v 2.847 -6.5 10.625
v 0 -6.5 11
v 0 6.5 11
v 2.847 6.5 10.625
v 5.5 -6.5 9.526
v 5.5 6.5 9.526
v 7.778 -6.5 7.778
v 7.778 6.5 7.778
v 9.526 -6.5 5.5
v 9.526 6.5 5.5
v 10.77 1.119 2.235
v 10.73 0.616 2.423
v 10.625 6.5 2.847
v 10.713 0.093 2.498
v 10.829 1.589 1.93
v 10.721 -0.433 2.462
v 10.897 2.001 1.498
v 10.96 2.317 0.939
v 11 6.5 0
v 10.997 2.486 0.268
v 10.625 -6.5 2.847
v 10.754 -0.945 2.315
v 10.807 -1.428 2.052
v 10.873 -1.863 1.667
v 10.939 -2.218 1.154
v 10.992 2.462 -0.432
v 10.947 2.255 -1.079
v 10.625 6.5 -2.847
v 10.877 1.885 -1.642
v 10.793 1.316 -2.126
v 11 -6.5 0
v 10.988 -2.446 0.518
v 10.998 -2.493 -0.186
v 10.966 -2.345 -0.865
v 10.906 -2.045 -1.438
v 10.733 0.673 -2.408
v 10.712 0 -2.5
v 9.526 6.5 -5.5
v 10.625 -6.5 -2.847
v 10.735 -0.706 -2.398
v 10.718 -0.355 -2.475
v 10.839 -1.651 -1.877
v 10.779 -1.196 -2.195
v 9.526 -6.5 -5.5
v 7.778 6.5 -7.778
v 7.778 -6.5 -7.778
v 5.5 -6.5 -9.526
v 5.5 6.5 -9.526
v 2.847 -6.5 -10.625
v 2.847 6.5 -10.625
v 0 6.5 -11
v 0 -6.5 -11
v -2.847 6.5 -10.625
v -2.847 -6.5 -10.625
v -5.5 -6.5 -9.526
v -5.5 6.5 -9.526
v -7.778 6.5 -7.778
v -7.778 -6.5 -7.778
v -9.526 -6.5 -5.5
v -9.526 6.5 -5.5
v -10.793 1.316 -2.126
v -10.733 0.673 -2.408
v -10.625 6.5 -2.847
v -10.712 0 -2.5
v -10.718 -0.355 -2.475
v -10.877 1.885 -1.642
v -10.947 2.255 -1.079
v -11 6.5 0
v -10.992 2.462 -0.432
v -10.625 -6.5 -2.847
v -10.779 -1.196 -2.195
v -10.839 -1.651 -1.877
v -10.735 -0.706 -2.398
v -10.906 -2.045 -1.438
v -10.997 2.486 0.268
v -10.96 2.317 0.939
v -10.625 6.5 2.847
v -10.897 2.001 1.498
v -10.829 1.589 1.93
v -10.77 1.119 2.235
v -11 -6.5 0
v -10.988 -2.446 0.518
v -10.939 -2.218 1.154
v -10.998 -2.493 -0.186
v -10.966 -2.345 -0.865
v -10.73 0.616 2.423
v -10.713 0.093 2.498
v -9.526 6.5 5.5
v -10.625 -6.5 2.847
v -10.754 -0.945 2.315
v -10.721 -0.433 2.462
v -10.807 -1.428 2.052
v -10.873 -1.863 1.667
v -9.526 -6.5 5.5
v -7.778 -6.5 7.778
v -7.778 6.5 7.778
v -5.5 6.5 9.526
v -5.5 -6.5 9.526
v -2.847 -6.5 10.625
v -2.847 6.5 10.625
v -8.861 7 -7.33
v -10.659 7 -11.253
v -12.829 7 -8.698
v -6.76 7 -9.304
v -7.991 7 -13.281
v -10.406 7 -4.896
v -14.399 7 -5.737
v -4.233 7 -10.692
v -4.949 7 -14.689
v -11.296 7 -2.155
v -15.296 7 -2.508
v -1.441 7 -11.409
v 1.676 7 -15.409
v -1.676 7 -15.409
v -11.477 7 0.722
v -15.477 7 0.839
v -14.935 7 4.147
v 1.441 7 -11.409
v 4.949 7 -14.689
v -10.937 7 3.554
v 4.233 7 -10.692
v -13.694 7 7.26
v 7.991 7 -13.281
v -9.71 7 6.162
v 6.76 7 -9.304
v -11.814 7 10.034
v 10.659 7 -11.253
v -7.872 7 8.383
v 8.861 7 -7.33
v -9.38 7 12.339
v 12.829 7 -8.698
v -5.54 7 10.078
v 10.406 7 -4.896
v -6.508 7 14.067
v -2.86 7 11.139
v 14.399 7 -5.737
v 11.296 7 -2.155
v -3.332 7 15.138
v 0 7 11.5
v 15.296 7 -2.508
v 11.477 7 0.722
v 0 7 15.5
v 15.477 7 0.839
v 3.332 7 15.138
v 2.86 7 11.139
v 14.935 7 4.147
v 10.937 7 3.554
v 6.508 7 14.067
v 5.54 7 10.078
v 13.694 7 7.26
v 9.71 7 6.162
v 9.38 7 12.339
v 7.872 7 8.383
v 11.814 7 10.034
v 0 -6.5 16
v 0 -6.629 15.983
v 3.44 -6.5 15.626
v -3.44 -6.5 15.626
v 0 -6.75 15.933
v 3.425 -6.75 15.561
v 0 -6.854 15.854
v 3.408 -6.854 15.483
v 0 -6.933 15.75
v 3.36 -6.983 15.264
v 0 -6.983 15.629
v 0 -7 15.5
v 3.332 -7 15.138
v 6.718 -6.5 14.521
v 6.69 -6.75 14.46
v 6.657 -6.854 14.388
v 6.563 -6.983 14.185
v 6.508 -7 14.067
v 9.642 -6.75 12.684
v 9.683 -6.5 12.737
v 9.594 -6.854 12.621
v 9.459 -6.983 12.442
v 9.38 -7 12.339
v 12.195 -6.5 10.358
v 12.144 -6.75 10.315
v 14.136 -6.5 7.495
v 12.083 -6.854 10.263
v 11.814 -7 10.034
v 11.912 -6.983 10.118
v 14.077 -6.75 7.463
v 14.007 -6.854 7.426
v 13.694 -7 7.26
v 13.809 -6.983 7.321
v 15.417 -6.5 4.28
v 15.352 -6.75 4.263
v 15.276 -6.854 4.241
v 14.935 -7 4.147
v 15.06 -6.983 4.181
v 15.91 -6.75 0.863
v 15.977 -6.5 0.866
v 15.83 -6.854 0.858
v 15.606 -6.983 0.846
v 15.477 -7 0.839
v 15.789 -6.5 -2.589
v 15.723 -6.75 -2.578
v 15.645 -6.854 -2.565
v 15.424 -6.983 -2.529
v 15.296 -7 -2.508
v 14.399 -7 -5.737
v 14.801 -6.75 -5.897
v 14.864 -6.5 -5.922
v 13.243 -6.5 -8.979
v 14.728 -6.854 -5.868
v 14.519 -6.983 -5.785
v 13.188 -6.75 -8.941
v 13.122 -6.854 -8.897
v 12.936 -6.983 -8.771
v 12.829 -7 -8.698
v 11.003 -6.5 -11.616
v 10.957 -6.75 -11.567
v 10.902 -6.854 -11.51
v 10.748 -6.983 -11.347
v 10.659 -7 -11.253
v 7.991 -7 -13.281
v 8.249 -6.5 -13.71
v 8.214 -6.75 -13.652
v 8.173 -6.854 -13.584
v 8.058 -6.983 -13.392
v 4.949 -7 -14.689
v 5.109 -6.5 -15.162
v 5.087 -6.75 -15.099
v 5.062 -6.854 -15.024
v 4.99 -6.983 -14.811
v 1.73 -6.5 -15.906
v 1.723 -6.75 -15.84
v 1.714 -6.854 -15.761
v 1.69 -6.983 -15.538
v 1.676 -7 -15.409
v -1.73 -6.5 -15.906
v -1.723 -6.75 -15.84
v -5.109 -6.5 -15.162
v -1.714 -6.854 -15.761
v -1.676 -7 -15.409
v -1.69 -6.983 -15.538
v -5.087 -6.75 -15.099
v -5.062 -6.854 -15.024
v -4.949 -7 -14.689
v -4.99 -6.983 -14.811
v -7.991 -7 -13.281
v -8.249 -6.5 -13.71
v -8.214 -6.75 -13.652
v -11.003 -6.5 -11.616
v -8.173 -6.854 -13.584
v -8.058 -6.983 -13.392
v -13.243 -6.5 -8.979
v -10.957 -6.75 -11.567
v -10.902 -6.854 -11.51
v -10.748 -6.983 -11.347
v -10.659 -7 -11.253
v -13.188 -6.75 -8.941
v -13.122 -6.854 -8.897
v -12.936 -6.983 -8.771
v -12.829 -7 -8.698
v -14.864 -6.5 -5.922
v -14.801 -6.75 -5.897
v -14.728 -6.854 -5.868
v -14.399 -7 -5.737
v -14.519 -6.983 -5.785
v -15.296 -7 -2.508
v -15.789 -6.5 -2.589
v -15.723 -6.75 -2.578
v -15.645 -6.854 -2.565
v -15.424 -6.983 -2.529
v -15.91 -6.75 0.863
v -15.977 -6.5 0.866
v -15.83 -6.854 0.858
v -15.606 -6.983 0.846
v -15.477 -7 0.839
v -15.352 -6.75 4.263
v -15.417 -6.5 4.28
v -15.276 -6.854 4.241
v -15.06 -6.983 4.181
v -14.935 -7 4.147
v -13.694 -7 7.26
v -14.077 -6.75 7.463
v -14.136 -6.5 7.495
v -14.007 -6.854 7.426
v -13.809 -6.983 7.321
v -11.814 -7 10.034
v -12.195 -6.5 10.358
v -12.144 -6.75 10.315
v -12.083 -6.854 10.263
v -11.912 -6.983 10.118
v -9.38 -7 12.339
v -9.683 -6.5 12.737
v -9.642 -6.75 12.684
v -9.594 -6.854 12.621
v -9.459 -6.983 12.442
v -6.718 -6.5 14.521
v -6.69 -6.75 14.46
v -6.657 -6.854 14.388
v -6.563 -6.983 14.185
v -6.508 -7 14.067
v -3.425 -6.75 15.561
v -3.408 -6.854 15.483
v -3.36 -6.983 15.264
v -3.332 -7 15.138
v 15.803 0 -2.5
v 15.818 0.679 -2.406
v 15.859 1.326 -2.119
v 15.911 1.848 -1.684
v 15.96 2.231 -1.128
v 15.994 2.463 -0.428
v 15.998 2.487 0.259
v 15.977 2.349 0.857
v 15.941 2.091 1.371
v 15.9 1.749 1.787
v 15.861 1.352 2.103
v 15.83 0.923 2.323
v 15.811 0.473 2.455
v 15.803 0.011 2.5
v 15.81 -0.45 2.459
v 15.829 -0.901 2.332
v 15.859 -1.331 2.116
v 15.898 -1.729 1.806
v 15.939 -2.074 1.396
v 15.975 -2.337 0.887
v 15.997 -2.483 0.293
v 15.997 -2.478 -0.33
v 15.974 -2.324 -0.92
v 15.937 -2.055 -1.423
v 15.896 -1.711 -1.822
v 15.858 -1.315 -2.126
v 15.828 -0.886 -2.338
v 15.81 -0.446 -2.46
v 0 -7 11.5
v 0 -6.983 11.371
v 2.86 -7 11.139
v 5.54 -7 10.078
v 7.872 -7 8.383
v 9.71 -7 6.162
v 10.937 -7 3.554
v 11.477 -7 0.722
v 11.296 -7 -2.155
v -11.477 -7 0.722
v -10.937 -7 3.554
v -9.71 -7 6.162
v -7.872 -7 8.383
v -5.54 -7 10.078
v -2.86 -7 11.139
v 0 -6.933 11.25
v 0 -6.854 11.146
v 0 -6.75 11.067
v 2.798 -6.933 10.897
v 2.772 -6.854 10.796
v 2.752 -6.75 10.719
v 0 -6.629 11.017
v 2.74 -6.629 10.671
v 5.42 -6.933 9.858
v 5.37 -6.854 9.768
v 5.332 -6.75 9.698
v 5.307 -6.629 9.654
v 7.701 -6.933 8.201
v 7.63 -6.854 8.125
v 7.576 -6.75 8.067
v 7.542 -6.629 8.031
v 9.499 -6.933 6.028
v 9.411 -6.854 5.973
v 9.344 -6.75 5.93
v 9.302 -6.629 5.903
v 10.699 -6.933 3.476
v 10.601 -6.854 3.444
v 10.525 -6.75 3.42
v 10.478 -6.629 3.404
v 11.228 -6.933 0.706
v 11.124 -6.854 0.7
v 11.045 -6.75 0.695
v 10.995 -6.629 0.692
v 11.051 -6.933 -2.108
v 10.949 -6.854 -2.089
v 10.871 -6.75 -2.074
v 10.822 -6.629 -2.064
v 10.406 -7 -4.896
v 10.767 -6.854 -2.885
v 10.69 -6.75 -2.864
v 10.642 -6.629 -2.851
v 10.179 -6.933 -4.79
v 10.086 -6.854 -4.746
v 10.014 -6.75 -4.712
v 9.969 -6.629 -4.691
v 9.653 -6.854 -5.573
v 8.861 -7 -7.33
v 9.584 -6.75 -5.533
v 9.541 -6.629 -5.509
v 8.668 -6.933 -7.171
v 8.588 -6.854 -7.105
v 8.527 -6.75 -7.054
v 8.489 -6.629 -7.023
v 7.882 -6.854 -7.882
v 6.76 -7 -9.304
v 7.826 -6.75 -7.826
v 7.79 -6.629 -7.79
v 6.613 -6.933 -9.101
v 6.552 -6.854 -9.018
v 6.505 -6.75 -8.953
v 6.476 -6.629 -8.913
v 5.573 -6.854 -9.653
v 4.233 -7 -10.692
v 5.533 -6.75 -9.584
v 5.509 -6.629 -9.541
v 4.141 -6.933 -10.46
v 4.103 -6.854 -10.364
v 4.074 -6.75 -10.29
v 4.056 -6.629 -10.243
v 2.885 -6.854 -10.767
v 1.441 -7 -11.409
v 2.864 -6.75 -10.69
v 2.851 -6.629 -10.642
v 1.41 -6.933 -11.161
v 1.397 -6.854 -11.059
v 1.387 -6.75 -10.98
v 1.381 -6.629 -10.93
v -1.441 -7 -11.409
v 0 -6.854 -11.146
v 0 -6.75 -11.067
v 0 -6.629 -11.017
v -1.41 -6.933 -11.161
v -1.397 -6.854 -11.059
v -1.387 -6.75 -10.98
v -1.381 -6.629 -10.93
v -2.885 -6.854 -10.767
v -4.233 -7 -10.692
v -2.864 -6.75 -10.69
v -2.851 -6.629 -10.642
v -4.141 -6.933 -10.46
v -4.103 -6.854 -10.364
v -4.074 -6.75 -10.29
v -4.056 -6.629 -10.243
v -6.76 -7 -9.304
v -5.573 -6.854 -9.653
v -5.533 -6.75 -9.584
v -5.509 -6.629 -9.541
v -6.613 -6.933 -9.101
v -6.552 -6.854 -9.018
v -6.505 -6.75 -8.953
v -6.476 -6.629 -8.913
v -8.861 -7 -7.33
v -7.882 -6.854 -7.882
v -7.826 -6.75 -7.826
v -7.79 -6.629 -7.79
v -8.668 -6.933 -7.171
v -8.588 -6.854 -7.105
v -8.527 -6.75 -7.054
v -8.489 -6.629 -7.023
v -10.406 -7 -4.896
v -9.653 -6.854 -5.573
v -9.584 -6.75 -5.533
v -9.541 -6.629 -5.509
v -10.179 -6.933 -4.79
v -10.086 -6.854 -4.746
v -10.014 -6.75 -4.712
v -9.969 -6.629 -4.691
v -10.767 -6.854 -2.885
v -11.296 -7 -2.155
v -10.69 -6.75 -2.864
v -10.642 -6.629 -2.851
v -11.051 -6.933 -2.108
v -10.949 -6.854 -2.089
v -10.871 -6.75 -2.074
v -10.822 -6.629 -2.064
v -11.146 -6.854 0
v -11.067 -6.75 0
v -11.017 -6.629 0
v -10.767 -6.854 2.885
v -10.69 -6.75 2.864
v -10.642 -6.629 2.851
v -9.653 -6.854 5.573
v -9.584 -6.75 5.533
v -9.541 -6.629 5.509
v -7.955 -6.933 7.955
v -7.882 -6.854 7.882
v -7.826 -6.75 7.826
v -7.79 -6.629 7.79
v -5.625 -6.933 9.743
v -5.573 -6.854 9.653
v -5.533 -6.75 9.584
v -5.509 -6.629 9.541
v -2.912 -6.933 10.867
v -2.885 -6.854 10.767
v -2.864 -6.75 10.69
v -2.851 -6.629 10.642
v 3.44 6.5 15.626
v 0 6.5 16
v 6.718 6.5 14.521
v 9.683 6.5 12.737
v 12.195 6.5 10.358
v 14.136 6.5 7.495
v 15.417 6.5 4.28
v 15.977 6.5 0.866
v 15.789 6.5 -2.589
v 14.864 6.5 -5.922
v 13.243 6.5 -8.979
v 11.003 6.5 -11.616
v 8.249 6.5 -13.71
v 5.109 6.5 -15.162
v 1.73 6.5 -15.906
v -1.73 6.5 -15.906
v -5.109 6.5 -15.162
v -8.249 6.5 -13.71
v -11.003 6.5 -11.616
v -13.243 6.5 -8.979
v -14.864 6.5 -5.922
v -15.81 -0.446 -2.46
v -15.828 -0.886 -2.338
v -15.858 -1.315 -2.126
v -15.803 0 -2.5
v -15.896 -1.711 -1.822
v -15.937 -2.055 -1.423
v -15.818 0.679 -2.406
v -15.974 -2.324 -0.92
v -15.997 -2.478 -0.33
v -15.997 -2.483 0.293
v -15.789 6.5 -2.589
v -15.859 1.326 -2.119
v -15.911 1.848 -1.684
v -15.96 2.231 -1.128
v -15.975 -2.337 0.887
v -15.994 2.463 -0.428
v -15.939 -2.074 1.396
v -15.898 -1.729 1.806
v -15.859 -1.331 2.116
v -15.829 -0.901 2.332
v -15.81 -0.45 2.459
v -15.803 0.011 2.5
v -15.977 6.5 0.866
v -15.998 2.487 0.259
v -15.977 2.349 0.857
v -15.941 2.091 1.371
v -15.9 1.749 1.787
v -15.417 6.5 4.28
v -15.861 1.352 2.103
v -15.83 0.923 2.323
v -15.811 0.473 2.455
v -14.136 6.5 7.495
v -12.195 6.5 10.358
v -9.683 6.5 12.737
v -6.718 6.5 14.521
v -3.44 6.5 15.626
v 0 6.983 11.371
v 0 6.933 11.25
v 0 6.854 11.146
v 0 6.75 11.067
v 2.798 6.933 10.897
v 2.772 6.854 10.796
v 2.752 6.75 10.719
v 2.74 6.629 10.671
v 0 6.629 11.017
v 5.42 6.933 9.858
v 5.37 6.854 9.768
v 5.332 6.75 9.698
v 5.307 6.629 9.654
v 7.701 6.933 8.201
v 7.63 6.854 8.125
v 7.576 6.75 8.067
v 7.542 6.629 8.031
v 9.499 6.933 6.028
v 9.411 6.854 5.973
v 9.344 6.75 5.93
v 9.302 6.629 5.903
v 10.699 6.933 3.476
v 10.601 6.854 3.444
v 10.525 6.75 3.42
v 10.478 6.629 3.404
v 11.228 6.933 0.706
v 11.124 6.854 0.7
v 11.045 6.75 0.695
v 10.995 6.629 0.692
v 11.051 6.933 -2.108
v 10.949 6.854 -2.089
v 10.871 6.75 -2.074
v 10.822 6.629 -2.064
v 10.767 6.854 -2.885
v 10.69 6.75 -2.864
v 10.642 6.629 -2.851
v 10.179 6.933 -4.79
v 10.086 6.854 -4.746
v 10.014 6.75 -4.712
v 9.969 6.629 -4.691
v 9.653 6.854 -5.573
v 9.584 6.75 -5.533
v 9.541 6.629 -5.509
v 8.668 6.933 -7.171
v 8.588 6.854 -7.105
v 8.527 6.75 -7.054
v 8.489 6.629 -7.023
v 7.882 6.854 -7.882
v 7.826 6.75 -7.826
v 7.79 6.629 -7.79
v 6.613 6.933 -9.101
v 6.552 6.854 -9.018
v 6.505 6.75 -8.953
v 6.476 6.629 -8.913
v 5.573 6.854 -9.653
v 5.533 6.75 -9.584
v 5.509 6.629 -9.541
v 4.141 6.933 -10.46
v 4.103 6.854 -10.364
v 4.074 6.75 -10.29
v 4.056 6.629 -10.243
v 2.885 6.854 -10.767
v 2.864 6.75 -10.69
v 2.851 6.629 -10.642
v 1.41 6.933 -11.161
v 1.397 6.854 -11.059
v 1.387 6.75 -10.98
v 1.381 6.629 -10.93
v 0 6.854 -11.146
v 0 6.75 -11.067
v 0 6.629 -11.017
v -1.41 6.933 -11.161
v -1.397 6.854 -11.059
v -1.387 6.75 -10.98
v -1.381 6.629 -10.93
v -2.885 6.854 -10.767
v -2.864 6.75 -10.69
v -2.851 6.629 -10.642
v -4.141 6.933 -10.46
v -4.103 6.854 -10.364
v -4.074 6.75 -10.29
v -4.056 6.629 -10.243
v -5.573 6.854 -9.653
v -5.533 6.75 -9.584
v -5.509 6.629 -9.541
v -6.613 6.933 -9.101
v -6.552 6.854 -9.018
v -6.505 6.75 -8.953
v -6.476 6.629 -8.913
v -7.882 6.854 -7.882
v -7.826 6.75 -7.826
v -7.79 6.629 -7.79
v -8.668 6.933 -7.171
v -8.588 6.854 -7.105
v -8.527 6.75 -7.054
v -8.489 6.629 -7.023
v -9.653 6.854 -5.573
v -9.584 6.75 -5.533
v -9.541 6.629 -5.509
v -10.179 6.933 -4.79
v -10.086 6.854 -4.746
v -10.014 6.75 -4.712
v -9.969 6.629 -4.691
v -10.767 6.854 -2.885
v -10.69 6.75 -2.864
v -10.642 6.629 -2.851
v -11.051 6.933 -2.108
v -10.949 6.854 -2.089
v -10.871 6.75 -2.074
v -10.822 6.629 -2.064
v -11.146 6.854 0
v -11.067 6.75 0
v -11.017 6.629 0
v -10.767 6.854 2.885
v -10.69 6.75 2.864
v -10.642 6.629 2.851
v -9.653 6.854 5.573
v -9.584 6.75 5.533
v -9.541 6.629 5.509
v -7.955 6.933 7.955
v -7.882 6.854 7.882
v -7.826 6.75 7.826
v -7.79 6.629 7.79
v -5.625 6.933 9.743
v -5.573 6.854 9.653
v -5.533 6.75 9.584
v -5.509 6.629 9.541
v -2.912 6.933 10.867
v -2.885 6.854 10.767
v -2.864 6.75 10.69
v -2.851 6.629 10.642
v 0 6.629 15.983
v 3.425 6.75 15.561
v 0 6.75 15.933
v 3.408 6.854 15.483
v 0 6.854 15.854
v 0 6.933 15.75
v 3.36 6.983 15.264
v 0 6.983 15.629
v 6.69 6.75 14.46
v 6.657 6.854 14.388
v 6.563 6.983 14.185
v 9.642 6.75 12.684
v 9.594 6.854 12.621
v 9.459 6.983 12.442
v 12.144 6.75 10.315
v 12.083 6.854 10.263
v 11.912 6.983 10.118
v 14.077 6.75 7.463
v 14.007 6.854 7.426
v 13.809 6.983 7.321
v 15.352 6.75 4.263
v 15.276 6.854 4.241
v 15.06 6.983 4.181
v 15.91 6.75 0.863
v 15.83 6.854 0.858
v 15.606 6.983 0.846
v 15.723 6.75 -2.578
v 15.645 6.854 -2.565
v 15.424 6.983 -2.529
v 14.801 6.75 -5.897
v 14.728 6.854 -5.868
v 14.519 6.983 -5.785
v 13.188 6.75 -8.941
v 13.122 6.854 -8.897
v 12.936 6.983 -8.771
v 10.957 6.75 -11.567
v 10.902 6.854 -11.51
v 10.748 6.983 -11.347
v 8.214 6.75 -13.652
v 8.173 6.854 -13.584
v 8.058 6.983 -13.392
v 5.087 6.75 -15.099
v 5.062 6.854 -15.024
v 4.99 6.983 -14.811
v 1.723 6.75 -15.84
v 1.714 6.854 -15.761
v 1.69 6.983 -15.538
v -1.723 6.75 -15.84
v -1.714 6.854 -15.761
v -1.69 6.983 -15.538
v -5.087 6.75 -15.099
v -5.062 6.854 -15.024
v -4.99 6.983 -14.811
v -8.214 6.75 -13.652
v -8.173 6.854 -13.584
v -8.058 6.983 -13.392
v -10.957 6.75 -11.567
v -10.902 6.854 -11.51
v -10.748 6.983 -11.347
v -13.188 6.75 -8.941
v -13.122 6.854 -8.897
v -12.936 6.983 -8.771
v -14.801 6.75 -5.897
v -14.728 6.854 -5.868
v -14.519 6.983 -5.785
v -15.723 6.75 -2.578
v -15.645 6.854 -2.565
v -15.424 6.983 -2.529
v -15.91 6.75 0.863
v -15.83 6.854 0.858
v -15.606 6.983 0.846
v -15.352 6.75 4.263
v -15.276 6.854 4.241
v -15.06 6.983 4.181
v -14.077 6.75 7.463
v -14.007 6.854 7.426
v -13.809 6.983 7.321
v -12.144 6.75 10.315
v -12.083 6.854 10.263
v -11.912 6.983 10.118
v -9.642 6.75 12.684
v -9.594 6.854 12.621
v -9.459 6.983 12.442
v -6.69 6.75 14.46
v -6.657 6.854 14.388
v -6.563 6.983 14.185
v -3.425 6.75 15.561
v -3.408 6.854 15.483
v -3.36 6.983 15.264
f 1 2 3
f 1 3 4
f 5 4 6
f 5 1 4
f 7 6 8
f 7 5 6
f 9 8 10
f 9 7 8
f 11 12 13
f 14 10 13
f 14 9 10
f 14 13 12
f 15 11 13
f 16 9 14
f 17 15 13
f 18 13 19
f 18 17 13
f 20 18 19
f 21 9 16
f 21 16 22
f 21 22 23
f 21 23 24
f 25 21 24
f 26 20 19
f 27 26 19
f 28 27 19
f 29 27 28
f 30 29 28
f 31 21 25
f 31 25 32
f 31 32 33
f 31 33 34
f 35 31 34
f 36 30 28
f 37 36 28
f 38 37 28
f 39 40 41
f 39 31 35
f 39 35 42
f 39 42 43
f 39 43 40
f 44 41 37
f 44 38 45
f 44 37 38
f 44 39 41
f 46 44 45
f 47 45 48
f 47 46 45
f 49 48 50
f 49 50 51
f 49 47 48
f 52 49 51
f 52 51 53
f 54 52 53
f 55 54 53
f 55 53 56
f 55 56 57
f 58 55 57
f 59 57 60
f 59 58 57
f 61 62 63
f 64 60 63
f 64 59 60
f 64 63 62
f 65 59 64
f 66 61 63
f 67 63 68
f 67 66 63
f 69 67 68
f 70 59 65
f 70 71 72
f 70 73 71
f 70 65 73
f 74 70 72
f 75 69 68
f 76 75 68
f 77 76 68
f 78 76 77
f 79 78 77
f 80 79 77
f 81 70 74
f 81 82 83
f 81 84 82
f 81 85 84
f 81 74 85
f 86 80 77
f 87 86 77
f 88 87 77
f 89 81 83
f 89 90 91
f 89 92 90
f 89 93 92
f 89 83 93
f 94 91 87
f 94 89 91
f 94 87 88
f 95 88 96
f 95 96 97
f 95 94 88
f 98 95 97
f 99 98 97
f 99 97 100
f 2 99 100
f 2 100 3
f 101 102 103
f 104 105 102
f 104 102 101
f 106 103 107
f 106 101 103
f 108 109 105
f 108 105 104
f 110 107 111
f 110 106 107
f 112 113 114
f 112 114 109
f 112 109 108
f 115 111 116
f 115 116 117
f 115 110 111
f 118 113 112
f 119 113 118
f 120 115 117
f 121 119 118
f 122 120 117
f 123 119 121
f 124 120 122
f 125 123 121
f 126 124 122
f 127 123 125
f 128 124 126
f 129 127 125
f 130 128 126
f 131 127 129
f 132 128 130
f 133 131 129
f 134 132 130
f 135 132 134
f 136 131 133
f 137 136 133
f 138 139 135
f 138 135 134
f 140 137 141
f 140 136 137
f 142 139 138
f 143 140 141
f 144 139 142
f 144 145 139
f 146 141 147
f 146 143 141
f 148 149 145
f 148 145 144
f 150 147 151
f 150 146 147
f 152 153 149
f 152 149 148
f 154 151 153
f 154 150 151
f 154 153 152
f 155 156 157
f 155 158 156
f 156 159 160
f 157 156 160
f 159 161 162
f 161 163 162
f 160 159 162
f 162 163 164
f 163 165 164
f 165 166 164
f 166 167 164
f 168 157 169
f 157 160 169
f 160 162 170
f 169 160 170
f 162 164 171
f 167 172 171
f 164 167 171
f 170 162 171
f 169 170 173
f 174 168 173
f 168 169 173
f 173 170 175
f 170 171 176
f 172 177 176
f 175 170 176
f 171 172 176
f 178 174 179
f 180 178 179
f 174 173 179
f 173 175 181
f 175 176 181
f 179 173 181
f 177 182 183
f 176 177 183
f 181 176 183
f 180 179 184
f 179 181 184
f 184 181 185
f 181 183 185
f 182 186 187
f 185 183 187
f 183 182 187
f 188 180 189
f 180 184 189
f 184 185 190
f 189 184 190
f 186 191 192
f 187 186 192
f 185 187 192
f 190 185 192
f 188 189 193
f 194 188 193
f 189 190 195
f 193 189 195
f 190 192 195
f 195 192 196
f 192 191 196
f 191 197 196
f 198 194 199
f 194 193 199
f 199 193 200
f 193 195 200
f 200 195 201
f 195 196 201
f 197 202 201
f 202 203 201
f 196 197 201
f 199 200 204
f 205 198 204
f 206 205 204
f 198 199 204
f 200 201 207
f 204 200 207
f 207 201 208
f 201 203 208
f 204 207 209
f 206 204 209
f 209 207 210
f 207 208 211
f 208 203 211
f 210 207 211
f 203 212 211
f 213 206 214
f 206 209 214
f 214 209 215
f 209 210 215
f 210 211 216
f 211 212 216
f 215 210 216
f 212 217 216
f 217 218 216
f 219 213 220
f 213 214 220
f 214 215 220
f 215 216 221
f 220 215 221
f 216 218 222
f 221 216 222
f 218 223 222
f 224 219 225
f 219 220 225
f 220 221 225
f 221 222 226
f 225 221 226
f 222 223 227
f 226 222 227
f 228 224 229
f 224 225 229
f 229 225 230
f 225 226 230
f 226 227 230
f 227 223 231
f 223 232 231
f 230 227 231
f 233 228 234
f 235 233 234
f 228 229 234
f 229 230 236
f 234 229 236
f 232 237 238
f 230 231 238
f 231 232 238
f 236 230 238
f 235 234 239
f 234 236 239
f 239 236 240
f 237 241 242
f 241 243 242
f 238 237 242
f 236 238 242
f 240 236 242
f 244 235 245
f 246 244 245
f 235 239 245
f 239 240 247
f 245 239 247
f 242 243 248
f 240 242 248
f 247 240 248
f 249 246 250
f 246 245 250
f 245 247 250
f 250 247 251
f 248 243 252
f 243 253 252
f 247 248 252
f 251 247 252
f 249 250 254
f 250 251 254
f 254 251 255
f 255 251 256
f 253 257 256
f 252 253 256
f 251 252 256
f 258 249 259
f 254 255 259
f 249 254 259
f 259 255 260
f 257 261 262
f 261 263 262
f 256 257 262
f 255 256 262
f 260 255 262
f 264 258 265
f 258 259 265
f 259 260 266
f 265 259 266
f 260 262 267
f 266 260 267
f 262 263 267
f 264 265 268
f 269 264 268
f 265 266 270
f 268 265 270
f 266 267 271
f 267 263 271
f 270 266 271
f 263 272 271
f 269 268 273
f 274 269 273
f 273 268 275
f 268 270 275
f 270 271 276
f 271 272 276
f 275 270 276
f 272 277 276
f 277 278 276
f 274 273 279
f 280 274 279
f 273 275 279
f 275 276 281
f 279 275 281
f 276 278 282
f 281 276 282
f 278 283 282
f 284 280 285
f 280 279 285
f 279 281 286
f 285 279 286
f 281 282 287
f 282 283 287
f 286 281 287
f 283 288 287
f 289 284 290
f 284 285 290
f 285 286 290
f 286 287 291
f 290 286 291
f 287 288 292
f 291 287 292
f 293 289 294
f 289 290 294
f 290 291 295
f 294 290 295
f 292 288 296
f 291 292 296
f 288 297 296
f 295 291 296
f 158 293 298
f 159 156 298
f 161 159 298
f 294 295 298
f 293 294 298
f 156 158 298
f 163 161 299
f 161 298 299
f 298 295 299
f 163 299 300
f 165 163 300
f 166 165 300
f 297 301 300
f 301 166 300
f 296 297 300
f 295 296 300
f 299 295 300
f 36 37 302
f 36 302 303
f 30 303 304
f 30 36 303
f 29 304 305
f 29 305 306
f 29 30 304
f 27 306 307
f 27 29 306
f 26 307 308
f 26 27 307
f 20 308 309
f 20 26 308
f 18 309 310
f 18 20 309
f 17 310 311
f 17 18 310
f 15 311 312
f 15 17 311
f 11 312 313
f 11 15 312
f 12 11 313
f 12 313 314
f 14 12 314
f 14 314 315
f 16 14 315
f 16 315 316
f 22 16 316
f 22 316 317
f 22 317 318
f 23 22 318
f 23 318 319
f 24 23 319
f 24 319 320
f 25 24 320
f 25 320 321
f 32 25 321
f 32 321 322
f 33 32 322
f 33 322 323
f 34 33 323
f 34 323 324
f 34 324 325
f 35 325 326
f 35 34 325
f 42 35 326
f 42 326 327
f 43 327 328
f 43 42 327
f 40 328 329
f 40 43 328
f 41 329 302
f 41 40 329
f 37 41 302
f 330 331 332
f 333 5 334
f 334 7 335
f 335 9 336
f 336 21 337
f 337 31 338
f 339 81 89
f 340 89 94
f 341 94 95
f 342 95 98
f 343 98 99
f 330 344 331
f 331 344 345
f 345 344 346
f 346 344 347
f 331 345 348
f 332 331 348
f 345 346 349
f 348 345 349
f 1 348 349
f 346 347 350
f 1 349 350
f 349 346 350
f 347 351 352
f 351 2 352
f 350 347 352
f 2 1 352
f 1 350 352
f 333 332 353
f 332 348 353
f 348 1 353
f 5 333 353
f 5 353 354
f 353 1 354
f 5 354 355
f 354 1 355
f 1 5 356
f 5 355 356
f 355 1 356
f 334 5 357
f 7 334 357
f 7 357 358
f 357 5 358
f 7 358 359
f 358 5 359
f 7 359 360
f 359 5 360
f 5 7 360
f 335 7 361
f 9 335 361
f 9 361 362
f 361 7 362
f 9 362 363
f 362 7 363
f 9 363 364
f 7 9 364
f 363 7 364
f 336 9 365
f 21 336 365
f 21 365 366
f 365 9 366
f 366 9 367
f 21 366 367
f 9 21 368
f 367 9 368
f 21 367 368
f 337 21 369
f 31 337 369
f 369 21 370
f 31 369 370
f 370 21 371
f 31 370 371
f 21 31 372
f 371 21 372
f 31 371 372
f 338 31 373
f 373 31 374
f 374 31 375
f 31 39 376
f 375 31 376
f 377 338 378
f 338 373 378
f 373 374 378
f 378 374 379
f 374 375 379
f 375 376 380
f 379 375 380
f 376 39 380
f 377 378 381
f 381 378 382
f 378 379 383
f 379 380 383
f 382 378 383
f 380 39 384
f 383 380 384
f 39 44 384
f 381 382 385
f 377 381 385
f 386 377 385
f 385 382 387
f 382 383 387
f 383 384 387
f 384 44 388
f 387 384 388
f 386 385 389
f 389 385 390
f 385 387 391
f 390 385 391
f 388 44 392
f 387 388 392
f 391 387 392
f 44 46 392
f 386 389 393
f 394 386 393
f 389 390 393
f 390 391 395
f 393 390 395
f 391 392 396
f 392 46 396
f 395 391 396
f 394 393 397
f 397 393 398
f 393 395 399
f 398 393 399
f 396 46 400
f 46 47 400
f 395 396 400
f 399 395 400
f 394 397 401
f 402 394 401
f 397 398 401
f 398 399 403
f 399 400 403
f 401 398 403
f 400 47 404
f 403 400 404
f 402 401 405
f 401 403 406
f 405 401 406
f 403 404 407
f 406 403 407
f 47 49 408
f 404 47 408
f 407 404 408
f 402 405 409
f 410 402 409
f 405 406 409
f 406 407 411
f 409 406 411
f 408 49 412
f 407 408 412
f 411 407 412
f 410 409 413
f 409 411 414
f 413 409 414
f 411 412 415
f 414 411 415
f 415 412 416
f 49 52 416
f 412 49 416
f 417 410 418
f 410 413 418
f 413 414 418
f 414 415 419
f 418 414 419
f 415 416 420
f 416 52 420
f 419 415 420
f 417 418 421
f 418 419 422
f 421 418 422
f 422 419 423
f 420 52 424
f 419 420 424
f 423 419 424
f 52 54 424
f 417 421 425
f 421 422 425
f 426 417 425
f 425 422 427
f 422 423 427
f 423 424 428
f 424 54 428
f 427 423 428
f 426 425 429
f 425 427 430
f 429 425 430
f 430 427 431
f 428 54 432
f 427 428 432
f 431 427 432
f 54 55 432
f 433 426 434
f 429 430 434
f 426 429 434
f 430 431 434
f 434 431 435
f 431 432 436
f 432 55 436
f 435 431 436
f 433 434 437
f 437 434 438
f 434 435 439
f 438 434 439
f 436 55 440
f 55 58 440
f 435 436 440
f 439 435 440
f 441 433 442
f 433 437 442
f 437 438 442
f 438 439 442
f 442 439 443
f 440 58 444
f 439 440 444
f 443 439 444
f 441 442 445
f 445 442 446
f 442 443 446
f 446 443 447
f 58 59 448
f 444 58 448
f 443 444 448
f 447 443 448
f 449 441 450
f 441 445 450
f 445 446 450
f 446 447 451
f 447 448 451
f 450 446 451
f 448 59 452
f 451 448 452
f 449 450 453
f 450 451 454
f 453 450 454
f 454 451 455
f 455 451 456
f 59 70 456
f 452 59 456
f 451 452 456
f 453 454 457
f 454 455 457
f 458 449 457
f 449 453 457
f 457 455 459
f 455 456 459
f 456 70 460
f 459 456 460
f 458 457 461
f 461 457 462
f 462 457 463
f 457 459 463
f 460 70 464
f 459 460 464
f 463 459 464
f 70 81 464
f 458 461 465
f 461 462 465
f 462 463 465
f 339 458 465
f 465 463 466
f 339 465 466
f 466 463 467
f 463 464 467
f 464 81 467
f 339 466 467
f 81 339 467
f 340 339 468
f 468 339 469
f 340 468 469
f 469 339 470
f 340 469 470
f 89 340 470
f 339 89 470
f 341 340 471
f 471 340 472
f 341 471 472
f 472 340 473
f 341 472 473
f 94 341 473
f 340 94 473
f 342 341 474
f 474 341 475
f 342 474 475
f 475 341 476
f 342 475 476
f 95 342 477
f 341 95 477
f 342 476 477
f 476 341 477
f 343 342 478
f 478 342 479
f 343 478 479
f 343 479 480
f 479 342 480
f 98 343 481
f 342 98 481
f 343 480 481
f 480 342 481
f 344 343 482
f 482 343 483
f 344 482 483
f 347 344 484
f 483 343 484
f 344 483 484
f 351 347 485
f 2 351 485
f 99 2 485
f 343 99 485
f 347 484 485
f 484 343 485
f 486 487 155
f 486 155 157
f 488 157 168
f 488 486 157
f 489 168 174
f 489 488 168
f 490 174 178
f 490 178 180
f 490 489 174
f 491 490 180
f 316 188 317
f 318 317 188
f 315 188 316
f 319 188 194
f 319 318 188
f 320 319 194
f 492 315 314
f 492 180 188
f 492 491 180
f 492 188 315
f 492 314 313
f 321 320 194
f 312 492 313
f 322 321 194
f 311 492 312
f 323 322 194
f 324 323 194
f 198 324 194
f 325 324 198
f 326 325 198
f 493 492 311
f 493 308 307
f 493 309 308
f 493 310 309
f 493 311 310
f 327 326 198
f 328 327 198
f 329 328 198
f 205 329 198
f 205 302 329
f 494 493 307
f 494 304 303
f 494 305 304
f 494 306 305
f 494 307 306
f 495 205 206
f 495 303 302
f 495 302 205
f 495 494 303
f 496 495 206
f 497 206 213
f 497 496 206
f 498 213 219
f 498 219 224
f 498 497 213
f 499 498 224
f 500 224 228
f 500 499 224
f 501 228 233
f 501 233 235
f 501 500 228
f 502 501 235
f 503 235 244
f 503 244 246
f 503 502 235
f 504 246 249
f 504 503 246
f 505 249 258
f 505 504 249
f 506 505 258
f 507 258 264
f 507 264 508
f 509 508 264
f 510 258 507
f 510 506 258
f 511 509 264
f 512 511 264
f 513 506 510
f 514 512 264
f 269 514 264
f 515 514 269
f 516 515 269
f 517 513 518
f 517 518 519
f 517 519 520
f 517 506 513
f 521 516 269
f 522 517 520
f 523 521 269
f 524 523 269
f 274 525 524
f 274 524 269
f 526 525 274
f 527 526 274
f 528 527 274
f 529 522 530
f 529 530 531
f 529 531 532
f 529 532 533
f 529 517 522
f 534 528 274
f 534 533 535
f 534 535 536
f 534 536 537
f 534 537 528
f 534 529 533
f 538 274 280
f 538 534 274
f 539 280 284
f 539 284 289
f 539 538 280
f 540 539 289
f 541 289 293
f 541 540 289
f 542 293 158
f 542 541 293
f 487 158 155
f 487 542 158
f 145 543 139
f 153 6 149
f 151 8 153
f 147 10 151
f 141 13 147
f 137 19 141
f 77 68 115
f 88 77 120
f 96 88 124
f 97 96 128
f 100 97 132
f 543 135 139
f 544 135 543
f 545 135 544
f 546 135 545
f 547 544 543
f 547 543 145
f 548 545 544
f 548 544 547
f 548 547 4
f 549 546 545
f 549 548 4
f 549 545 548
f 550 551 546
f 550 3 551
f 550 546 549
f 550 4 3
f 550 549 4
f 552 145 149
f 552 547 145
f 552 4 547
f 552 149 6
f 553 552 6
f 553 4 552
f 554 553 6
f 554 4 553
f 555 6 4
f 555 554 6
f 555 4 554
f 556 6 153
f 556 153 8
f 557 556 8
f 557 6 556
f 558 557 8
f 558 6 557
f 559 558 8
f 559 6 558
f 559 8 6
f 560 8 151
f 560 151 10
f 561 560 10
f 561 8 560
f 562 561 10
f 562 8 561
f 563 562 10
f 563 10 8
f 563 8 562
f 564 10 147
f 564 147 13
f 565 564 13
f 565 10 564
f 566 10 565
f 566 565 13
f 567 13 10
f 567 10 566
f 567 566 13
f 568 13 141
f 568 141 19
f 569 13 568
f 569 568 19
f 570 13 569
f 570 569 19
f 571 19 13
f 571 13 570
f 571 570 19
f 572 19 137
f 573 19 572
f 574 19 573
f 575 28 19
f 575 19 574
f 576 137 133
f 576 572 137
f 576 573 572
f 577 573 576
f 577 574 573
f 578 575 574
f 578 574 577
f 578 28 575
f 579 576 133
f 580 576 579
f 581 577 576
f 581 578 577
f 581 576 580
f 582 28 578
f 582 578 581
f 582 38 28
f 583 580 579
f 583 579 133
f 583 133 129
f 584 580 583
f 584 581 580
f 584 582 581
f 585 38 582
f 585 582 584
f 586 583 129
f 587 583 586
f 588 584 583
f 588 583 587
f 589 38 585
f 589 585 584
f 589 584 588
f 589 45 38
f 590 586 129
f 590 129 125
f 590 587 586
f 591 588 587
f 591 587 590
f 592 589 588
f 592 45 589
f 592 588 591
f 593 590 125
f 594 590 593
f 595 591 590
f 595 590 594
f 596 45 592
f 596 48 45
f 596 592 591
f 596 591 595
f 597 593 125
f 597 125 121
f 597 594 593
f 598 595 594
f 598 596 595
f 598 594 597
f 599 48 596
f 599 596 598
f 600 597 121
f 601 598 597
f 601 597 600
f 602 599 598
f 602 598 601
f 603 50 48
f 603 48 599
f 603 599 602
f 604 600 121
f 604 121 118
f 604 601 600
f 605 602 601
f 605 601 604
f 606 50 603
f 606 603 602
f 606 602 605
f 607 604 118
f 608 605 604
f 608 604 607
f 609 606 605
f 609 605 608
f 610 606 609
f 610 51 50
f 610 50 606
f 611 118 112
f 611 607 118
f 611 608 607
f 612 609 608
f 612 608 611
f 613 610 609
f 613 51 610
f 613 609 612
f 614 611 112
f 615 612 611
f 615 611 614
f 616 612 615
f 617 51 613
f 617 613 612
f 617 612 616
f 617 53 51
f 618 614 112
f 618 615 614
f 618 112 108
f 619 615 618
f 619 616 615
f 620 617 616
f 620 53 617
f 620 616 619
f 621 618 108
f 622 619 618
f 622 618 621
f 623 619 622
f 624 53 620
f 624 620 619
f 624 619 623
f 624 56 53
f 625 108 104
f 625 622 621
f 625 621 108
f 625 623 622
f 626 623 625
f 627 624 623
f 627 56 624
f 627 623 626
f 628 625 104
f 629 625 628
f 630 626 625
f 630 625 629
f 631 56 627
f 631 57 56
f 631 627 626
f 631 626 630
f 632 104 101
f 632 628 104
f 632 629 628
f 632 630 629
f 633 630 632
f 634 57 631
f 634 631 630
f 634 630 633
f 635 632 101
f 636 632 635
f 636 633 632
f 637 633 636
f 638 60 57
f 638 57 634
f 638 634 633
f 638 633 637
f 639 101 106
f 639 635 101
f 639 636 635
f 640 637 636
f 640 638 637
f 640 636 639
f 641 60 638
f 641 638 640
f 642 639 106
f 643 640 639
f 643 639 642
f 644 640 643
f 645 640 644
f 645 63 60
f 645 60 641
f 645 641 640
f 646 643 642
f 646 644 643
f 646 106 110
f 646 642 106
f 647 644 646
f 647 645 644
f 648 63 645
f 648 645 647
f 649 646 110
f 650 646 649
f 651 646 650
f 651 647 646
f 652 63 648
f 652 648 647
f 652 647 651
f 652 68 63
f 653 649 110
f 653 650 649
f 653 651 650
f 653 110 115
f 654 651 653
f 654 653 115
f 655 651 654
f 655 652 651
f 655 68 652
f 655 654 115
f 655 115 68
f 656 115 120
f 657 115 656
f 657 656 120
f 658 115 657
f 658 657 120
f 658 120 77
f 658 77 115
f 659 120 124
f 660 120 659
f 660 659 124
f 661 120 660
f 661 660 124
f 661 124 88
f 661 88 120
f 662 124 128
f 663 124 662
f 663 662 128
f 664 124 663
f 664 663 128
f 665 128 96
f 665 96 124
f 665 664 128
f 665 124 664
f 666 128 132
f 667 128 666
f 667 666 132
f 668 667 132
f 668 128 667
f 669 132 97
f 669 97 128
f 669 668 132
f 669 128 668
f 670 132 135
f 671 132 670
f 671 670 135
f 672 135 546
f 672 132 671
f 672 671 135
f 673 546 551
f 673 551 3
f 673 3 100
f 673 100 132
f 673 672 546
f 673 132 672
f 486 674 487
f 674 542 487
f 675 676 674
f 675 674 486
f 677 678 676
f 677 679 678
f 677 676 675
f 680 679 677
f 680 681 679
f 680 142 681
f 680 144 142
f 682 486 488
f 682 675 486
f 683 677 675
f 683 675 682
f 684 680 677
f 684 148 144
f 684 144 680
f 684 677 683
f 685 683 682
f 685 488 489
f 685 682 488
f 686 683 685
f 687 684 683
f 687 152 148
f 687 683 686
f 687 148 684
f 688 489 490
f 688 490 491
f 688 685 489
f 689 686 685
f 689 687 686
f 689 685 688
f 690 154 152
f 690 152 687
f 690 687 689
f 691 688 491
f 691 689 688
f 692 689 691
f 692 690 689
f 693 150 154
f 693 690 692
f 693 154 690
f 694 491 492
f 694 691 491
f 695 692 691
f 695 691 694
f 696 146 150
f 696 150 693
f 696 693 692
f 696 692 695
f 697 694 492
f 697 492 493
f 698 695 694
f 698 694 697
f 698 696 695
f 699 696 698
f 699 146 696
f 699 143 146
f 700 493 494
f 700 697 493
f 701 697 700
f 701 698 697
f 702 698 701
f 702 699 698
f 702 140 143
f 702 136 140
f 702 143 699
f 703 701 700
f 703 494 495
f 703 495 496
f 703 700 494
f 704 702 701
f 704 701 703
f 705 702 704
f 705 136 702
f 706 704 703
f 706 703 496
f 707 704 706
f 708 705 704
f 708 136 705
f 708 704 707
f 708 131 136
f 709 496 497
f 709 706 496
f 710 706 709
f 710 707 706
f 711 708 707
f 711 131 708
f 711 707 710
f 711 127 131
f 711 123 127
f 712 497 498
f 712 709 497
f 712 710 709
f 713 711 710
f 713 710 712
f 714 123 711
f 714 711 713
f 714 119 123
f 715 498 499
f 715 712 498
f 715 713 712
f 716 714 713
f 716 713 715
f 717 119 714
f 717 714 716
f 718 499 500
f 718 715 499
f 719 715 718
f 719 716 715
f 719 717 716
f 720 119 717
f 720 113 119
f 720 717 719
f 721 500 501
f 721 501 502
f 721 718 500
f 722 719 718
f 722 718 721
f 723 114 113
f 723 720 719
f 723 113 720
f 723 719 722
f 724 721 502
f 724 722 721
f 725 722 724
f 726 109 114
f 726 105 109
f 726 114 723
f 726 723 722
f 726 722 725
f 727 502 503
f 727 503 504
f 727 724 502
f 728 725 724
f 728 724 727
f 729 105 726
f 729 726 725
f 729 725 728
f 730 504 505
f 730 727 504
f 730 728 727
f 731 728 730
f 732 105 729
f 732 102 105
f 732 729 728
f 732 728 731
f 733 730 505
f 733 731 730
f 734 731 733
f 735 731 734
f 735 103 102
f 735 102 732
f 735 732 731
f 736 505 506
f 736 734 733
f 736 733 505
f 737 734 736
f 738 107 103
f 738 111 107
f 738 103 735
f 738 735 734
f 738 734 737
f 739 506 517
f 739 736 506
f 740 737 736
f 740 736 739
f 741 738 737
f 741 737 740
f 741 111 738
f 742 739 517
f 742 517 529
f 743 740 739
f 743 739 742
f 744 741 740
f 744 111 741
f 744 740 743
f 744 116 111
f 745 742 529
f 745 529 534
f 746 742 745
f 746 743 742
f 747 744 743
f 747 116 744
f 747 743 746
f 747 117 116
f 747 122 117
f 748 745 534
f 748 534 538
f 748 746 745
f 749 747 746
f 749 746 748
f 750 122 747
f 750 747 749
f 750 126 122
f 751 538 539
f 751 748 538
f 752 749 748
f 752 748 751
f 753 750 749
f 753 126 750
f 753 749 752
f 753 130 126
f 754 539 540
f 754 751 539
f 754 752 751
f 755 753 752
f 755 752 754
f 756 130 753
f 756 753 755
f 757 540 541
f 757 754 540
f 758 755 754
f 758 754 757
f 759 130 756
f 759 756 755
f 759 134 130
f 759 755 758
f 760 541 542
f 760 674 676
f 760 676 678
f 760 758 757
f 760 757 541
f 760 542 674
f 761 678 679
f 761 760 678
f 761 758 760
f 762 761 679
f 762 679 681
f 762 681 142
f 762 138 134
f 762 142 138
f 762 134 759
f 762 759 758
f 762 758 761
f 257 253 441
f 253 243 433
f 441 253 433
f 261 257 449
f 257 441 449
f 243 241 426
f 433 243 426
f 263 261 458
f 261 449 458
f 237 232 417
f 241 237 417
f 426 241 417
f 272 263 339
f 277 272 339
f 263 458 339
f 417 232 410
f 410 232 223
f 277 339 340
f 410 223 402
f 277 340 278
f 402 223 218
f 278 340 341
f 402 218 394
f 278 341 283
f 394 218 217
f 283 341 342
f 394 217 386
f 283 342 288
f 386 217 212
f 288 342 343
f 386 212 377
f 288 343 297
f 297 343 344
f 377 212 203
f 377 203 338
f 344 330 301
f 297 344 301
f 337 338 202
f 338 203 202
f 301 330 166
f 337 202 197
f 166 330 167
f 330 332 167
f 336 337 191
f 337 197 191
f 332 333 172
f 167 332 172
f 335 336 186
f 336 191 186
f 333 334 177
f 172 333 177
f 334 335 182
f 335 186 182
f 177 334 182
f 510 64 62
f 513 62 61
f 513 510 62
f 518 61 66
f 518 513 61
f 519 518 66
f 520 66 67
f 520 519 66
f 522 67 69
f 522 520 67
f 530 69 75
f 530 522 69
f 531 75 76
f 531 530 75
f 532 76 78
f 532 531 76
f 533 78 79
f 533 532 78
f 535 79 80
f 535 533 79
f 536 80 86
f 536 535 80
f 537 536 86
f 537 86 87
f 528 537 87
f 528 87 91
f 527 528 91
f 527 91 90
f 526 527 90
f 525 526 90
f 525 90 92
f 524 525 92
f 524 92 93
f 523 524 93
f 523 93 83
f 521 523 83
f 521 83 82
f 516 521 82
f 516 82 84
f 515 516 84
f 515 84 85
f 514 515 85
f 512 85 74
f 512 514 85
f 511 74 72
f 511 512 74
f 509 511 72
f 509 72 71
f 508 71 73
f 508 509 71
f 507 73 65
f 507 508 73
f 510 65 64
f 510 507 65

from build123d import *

# Parameters (mm, degrees)
SKETCH1_R               = 16
SKETCH1_R_2             = 11
BOSS_EXTRUDE1_DEPTH     = 7
CUT_EXTRUDE1_DEPTH      = 24.685438565
CUT_EXTRUDE1_DEPTH_BACK = 24.685438565
SKETCH2_R               = 2.5
FILLET1_R               = 0.5


with BuildPart() as part:
    # Sketch1 → Boss-Extrude1 (new, symmetric)
    with BuildSketch(Plane(origin=(0, 0, 0), x_dir=(1, 0, 0), z_dir=(0, 1, 0))):
        with Locations(Location((0, 0, 0), (0, 0, 270))):
            Circle(SKETCH1_R)
        with Locations(Location((0, 0, 0), (0, 0, 270))):
            Circle(SKETCH1_R_2, mode=Mode.SUBTRACT)
    extrude(amount=BOSS_EXTRUDE1_DEPTH, both=True)

    # Sketch2 → Cut-Extrude1 (cut, two sides: drawn at the far end of the back side and taken through both)
    with BuildSketch(Plane(origin=(0, 0, 0), x_dir=(0, 0, -1), z_dir=(1, 0, 0)).offset(-CUT_EXTRUDE1_DEPTH_BACK)):
        Circle(SKETCH2_R)
    extrude(amount=CUT_EXTRUDE1_DEPTH + CUT_EXTRUDE1_DEPTH_BACK, mode=Mode.SUBTRACT)

    # Fillet1
    fillet1_edges = [part.edges().sort_by_distance(p)[0] for p in [
        (0, -7, -16),
        (0, 7, -16),
        (0, -7, -11),
        (0, 7, -11),
    ]]
    fillet(fillet1_edges, radius=FILLET1_R)


solid = part.part
